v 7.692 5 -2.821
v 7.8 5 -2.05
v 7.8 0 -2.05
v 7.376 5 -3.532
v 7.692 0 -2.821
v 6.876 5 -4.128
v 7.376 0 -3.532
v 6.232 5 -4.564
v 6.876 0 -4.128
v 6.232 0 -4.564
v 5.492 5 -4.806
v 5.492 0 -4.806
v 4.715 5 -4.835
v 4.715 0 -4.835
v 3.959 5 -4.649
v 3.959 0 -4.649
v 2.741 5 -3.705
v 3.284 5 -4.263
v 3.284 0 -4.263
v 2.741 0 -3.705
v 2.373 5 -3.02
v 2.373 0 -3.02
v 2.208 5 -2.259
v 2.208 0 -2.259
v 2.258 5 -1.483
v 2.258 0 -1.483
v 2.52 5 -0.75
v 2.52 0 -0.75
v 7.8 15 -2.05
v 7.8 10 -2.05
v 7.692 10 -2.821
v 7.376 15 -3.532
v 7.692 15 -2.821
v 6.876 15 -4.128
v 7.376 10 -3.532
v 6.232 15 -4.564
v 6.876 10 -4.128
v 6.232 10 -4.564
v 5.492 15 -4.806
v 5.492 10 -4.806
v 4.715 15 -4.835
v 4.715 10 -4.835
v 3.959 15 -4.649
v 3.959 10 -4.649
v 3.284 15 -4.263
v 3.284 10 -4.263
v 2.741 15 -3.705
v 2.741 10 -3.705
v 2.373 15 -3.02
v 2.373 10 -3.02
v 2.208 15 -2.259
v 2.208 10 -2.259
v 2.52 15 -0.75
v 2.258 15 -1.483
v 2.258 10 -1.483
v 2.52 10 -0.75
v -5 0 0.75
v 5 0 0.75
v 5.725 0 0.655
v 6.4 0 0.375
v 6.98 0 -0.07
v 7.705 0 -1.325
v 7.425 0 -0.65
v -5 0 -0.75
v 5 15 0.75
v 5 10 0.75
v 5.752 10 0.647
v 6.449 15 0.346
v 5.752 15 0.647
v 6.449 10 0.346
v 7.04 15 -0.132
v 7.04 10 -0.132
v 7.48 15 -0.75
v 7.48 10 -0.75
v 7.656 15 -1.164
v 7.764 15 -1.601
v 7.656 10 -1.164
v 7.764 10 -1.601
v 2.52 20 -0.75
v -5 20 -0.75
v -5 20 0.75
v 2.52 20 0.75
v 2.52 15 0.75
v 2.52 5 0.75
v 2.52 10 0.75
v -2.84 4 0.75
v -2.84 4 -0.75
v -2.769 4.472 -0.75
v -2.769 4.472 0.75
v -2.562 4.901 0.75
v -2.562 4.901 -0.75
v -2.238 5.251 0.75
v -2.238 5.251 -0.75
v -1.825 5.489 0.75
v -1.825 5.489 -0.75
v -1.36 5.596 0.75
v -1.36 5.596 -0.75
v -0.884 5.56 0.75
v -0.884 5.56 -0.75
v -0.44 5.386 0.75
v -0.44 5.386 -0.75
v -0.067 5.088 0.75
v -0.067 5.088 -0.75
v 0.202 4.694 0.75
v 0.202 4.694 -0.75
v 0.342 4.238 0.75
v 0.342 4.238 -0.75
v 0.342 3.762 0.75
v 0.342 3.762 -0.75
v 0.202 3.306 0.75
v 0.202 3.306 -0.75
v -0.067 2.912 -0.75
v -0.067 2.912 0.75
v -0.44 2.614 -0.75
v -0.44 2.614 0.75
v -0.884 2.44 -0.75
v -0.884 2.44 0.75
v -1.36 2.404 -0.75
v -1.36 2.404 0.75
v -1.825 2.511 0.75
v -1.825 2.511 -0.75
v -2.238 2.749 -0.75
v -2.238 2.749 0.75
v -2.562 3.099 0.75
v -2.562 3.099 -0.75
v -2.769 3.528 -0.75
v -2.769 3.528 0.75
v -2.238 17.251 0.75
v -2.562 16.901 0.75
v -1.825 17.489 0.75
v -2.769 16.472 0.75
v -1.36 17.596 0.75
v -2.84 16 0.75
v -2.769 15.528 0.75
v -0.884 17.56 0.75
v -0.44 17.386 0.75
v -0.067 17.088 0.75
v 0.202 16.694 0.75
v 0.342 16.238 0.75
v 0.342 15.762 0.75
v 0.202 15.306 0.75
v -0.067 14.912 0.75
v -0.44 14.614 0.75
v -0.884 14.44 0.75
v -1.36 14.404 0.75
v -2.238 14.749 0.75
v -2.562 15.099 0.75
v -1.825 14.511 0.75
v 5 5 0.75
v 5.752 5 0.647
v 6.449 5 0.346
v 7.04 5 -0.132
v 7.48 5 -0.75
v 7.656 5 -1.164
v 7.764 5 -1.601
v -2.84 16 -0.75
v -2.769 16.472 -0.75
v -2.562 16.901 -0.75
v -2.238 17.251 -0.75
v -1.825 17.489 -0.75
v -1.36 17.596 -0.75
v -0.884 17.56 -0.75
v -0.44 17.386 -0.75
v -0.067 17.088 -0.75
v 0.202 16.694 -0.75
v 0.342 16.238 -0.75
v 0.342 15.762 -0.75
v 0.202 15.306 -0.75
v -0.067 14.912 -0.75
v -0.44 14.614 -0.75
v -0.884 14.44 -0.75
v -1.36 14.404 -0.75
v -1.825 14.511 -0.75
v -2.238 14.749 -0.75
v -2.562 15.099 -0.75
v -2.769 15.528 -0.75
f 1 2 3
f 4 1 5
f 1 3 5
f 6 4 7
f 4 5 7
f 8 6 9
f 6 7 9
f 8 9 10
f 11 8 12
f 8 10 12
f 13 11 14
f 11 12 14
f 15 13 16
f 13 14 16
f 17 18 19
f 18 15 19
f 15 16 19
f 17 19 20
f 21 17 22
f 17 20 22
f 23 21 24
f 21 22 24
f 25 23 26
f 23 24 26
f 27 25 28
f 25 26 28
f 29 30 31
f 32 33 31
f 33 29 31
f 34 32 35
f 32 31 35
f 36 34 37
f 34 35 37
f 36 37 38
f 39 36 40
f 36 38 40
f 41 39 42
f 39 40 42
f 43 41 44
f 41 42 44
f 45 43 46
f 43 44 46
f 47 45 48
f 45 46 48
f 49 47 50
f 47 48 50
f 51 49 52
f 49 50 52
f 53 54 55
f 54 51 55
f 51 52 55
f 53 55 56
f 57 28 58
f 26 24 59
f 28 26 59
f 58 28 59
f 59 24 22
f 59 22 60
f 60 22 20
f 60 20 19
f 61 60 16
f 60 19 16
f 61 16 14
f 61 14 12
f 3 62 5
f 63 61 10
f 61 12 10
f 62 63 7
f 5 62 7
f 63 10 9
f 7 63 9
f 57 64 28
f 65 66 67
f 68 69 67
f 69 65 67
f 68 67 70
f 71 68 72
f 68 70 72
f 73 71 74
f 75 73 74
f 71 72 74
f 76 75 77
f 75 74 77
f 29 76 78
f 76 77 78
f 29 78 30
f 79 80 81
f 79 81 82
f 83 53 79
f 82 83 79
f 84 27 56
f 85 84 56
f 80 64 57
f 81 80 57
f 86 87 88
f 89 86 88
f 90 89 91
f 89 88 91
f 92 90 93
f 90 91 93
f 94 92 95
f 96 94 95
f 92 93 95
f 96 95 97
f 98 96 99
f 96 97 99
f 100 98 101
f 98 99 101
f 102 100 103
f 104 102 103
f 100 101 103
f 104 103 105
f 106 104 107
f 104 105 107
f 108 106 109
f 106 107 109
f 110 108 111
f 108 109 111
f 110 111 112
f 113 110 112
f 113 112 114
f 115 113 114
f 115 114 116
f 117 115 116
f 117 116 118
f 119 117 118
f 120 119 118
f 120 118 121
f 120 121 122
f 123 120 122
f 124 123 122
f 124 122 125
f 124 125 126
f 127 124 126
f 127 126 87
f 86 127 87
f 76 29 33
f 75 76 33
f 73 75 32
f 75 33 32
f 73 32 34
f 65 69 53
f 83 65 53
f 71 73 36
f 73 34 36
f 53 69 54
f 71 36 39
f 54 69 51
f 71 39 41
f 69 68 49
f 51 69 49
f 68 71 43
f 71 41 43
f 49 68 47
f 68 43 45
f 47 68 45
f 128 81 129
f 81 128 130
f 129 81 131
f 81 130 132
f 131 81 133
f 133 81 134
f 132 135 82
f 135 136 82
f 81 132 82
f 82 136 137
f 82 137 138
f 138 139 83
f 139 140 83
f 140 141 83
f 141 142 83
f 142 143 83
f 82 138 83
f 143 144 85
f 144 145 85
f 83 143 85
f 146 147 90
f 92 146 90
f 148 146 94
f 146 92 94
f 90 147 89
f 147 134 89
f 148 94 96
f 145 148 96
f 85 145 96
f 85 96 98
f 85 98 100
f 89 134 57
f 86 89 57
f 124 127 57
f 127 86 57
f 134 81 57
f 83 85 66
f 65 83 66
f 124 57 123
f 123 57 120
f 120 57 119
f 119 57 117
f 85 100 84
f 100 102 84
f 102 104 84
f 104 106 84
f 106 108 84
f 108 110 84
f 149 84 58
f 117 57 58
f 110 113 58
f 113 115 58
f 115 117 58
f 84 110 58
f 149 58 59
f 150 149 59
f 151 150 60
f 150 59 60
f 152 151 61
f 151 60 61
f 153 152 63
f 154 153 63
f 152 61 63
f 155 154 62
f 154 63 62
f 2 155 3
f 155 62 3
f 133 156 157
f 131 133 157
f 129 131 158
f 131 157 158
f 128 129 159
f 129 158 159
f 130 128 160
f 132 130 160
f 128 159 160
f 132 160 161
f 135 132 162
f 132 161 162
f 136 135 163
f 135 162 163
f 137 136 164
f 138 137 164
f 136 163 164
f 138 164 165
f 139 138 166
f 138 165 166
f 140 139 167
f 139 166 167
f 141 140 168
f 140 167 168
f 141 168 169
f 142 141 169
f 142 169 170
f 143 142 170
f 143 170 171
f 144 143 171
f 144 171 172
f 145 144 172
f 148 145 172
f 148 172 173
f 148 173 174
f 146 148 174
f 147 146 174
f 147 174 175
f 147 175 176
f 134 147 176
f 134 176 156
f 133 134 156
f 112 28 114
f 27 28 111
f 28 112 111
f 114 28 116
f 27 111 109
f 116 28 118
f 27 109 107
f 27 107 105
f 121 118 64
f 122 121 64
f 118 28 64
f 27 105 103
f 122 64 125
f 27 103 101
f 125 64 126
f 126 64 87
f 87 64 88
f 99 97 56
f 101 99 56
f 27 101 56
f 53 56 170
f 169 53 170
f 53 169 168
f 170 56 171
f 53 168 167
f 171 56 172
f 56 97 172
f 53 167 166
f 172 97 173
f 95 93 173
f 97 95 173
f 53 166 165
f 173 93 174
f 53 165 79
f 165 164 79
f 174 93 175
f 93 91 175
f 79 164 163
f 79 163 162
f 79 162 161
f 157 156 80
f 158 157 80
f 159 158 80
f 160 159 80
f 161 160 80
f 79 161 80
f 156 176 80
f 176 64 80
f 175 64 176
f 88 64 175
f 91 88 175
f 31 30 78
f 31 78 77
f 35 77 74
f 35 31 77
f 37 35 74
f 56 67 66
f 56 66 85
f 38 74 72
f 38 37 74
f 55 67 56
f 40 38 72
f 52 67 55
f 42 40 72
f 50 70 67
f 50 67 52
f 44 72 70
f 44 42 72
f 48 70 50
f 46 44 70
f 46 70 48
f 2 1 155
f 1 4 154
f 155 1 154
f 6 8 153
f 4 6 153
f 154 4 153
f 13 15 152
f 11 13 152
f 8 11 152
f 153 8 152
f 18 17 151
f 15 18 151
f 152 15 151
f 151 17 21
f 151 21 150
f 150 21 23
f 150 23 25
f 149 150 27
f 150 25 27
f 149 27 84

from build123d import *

# Parameters (mm, degrees)
EXTRUDE_2_DEPTH     = 20
SKETCH_4_W          = 4.1
SKETCH_4_H          = 5
CUT_EXTRUDE_1_DEPTH = 23
SKETCH_5_W          = 4.959838708
SKETCH_5_H          = 5
CUT_EXTRUDE_2_DEPTH = 23
SKETCH_6_R          = 1.6
CUT_EXTRUDE_3_DEPTH = 23


with BuildPart() as part:
    # 草图1 → 凸台-拉伸2 (new body)
    with BuildSketch(Plane(origin=(0, 0, 0), x_dir=(1, 0, 0), z_dir=(0, 1, 0))):
        with BuildLine():
            ThreePointArc((2.520080646, 0.75), (3.550862325, -0.34582971), (5, -0.75))
            Line((5, -0.75), (5, 0.75))
            Line((5, 0.75), (2.520080646, 0.75))
        make_face()
        with BuildLine():
            Line((5, 0.75), (5, -0.75))
            ThreePointArc((5, -0.75), (6.979898987, 0.070101013), (7.8, 2.05))
            ThreePointArc((7.8, 2.05), (4.330587642, 4.768802511), (2.520080646, 0.75))
            Line((2.520080646, 0.75), (5, 0.75))
        make_face()
        with BuildLine():
            ThreePointArc((2.520080646, 0.75), (3.550862325, -0.34582971), (5, -0.75))
            Line((5, -0.75), (5, 0.75))
            Line((5, 0.75), (2.520080646, 0.75))
        make_face()
        with BuildLine():
            Line((5, 0.75), (5, -0.75))
            ThreePointArc((5, -0.75), (6.979898987, 0.070101013), (7.8, 2.05))
            ThreePointArc((7.8, 2.05), (4.330587642, 4.768802511), (2.520080646, 0.75))
            Line((2.520080646, 0.75), (5, 0.75))
        make_face()
        with BuildLine():
            Line((-5, 0.75), (-5, -0.75))
            Line((-5, -0.75), (5, -0.75))
            ThreePointArc((5, -0.75), (3.550862325, -0.34582971), (2.520080646, 0.75))
            Line((2.520080646, 0.75), (-5, 0.75))
        make_face()
    extrude(amount=EXTRUDE_2_DEPTH)

    # 草图4 → 切除-拉伸1 (cut)
    with BuildSketch(Plane.ZY.offset(5)):
        with Locations((-2.8, 17.5)):
            Rectangle(SKETCH_4_W, SKETCH_4_H)
        with Locations((-2.8, 7.5)):
            Rectangle(SKETCH_4_W, SKETCH_4_H)
    extrude(amount=-CUT_EXTRUDE_1_DEPTH, mode=Mode.SUBTRACT)

    # 草图5 → 切除-拉伸2 (cut)
    with BuildSketch(Plane(origin=(0, 0, -0.75), x_dir=(-1, 0, 0), z_dir=(0, 0, -1))):
        with Locations((-5, 7.5)):
            Rectangle(SKETCH_5_W, SKETCH_5_H)
        with Locations((-5, 17.5)):
            Rectangle(SKETCH_5_W, SKETCH_5_H)
    extrude(amount=-CUT_EXTRUDE_2_DEPTH, mode=Mode.SUBTRACT)

    # 草图6 → 切除-拉伸3 (cut)
    with BuildSketch(Plane(origin=(0, 0, -0.75), x_dir=(-1, 0, 0), z_dir=(0, 0, -1))):
        with Locations((1.239959677, 16)):
            Circle(SKETCH_6_R)
        with Locations((1.239959677, 4)):
            Circle(SKETCH_6_R)
    extrude(amount=-CUT_EXTRUDE_3_DEPTH, mode=Mode.SUBTRACT)


solid = part.part
